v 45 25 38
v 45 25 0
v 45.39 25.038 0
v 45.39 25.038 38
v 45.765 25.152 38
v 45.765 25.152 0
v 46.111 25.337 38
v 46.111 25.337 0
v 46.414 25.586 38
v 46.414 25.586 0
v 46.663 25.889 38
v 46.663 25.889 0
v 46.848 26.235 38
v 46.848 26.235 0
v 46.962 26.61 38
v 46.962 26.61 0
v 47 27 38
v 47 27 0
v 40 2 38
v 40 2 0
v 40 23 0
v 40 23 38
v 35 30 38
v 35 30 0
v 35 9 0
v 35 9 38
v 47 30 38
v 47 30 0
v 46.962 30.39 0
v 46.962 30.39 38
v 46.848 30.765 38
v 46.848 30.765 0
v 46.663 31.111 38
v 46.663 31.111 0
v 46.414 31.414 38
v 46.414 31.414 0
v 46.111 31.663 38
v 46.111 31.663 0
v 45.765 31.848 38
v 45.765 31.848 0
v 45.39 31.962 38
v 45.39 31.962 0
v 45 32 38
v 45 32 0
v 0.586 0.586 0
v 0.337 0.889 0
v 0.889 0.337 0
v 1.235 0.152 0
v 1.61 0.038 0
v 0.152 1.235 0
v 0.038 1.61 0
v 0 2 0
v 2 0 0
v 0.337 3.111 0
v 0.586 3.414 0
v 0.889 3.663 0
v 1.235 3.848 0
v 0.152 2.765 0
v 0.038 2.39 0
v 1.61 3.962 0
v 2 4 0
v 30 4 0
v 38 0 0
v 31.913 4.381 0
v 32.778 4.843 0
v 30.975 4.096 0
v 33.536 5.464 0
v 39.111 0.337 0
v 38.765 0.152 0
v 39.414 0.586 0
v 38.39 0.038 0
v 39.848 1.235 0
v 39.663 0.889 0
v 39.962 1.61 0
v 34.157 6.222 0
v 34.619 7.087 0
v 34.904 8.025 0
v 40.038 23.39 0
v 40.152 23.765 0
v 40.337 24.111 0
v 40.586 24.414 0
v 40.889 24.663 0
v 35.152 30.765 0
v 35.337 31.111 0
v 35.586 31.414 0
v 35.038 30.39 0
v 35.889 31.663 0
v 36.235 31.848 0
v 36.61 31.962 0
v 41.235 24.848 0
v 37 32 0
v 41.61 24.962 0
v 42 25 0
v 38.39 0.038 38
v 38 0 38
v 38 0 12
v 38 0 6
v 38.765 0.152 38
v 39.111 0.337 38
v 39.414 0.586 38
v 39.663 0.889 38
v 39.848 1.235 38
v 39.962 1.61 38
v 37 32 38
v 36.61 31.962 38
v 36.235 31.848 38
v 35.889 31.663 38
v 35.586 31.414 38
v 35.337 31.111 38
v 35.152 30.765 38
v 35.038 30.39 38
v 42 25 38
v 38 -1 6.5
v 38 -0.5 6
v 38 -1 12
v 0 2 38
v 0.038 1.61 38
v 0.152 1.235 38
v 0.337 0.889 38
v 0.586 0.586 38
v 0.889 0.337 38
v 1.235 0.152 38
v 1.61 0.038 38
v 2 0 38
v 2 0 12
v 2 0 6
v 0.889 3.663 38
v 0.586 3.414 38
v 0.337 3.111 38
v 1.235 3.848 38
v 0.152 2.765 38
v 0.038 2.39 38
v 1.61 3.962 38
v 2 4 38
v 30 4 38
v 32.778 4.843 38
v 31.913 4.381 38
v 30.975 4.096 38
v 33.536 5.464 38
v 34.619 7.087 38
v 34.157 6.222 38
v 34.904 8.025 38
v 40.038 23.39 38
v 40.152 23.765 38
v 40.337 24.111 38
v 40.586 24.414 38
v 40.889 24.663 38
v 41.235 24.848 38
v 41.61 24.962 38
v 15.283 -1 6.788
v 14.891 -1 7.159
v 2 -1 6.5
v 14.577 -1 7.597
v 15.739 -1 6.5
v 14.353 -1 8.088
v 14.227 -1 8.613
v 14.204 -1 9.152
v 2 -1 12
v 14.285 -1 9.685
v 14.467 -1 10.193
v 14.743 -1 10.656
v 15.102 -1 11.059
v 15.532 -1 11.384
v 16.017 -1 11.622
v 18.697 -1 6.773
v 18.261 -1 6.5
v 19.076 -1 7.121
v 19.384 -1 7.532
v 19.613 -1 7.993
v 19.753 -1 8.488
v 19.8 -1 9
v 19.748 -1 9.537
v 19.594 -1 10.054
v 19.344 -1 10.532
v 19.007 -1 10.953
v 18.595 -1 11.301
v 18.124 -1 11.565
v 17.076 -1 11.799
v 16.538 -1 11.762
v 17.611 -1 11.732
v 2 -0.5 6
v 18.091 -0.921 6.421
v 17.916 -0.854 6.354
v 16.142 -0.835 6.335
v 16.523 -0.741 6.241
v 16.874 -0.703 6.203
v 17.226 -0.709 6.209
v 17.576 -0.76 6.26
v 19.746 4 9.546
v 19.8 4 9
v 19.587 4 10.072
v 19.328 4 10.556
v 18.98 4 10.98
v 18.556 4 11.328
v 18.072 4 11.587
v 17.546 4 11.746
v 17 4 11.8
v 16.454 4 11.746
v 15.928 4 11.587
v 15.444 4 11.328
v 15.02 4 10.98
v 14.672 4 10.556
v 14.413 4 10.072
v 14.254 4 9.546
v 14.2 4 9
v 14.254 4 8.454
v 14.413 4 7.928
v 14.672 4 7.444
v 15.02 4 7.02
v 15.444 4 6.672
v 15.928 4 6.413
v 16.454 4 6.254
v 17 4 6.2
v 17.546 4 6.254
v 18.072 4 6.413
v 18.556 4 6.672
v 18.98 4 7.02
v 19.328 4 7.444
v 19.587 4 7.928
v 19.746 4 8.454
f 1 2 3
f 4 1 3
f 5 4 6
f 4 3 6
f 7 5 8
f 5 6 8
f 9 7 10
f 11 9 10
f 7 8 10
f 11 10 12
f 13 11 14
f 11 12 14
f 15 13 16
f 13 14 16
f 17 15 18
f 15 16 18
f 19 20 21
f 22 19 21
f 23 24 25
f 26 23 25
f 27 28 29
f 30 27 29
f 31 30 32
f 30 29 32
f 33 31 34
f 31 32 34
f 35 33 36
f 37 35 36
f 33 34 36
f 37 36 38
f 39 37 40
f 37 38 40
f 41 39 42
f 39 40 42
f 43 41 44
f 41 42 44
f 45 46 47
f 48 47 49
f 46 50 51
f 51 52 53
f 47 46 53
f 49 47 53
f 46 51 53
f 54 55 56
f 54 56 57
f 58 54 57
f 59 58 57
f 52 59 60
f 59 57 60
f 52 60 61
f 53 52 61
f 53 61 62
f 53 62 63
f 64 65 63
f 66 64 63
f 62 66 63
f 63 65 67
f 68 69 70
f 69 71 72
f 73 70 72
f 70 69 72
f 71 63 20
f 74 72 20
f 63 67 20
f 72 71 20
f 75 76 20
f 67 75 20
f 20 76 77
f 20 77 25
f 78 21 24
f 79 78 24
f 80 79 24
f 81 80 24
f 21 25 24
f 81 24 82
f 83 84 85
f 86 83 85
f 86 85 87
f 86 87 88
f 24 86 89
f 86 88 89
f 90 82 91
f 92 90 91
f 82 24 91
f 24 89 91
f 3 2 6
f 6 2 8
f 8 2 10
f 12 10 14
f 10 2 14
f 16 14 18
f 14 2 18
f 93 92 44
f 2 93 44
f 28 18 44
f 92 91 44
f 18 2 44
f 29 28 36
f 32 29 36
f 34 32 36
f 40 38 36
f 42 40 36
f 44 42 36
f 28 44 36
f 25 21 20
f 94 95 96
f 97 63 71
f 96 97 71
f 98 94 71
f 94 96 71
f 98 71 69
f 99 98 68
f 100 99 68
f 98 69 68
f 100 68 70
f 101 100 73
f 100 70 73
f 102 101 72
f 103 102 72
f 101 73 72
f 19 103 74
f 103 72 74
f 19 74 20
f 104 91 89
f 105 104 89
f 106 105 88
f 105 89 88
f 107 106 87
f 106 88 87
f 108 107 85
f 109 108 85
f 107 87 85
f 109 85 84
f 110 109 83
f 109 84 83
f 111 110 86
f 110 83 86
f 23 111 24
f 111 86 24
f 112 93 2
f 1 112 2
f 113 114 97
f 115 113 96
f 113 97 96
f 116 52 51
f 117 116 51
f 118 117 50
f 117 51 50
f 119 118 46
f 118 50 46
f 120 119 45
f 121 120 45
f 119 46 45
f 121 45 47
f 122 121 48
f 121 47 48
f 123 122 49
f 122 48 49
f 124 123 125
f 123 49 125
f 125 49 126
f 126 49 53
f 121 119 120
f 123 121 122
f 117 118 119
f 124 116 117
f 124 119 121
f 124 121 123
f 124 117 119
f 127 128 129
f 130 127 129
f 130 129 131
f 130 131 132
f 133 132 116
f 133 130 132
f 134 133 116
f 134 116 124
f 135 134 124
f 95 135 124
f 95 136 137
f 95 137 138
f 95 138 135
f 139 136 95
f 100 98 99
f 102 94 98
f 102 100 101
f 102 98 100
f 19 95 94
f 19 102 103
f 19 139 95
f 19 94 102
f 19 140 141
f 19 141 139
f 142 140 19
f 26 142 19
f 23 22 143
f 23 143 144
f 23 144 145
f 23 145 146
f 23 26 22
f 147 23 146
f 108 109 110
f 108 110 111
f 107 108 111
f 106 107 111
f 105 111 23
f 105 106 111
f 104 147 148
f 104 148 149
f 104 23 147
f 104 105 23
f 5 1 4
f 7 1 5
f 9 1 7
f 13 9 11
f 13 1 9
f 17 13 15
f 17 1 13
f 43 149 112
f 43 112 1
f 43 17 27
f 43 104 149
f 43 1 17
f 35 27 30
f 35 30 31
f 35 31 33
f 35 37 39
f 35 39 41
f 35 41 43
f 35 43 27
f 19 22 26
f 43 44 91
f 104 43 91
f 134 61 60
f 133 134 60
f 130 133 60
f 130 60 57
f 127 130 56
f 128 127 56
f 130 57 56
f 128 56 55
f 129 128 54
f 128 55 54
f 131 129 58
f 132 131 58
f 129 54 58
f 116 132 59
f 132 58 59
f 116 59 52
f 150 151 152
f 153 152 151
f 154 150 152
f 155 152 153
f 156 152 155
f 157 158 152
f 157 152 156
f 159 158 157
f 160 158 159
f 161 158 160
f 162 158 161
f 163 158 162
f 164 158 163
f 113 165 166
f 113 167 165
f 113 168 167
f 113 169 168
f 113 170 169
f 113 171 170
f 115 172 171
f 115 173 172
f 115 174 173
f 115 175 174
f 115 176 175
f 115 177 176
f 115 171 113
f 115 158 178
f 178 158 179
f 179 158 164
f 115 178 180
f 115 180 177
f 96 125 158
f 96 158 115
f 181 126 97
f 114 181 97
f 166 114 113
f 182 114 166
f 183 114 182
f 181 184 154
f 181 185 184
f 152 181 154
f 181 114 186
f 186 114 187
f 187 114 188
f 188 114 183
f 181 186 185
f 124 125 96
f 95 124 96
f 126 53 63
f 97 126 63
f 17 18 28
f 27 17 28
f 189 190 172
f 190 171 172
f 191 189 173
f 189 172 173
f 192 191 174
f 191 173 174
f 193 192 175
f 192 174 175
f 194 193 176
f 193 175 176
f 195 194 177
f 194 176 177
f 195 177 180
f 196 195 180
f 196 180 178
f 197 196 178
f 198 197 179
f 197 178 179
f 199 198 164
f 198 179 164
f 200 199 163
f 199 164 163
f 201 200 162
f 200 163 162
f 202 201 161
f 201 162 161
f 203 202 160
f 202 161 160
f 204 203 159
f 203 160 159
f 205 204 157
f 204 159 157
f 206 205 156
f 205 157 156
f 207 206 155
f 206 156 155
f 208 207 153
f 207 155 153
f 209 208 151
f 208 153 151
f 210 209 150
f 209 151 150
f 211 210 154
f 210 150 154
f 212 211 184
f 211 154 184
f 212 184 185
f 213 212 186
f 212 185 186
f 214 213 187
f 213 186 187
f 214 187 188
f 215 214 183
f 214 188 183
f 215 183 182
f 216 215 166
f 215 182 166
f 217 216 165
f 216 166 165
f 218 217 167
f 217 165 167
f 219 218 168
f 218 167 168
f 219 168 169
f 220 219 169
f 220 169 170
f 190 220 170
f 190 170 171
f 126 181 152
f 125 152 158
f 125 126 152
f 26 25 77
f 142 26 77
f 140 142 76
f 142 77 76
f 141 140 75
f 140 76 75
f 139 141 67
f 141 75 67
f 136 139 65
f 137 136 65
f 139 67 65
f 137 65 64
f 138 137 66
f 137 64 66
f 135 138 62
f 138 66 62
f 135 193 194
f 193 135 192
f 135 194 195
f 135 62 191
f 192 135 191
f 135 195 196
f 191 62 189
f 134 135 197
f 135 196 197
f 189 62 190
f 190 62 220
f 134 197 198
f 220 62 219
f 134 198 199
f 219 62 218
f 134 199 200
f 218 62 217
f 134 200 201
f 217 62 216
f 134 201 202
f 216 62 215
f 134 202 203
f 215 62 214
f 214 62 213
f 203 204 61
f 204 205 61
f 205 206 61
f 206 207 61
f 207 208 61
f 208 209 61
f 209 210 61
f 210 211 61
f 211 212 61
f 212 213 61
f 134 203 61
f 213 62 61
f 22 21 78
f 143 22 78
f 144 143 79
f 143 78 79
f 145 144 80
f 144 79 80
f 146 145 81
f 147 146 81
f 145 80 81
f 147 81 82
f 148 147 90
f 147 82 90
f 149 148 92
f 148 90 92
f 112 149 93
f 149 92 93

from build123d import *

# Parameters (mm, degrees)
F1_DEPTH    = 38
F2_W        = 36
F2_H        = 6
F2_R        = 2.8
F3_DEPTH    = 1
F4_DEPTH    = 4
F5_T1_DEPTH = 38.571682988


# Not quite as in the source:
# - a fillet or chamfer that OpenCascade refuses, or shapes differently, is made with other operations: its cross-section is extruded or revolved along the edge and cut away or added


with BuildPart() as f1:
    # F0 (on Top) → F1 (new body)
    with BuildSketch(Plane.XY):
        with BuildLine():
            ThreePointArc((0, 2), (0.5857864376, 0.5857864376), (2, 0))
            Line((2, 0), (38, 0))
            ThreePointArc((38, 0), (39.4142135624, 0.5857864376), (40, 2))
            Line((40, 2), (40, 23))
            ThreePointArc((40, 23), (40.5857864376, 24.4142135624), (42, 25))
            Line((42, 25), (45, 25))
            ThreePointArc((45, 25), (46.4142135624, 25.5857864376), (47, 27))
            Line((47, 27), (47, 30))
            ThreePointArc((47, 30), (46.4142135624, 31.4142135624), (45, 32))
            Line((45, 32), (40, 32))
            Line((40, 32), (37, 32))
            ThreePointArc((37, 32), (35.5857864376, 31.4142135624), (35, 30))
            Line((35, 30), (35, 9))
            ThreePointArc((35, 9), (33.5355339059, 5.4644660941), (30, 4))
            Line((30, 4), (2, 4))
            ThreePointArc((2, 4), (0.5857864376, 3.4142135624), (0, 2))
        make_face()
    extrude(amount=F1_DEPTH)

    # F2 (on face) → F3 (join)
    with BuildSketch(Plane.XZ):
        with Locations((20, 9)):
            Rectangle(F2_W, F2_H)
        with Locations((17, 9)):
            Circle(F2_R, mode=Mode.SUBTRACT)
    extrude(amount=F3_DEPTH)

    # F4 (cut): a face of the model
    f4_faces = [f1.faces().sort_by_distance(p)[0] for p in [
        (17, 0, 9),
    ]]
    extrude(f4_faces, amount=-F4_DEPTH, mode=Mode.SUBTRACT)

    # F5: chamfer of 0.5 on 1 edges, made by hand

    # F5_s2 → F5_t1 (cut)
    with BuildSketch(Plane.YZ.offset(0.714158506)):
        Polygon((-0.5, 6), (-1, 6.5), (-1, 6), align=None)
    extrude(amount=F5_T1_DEPTH, mode=Mode.SUBTRACT)


solid = f1.part
